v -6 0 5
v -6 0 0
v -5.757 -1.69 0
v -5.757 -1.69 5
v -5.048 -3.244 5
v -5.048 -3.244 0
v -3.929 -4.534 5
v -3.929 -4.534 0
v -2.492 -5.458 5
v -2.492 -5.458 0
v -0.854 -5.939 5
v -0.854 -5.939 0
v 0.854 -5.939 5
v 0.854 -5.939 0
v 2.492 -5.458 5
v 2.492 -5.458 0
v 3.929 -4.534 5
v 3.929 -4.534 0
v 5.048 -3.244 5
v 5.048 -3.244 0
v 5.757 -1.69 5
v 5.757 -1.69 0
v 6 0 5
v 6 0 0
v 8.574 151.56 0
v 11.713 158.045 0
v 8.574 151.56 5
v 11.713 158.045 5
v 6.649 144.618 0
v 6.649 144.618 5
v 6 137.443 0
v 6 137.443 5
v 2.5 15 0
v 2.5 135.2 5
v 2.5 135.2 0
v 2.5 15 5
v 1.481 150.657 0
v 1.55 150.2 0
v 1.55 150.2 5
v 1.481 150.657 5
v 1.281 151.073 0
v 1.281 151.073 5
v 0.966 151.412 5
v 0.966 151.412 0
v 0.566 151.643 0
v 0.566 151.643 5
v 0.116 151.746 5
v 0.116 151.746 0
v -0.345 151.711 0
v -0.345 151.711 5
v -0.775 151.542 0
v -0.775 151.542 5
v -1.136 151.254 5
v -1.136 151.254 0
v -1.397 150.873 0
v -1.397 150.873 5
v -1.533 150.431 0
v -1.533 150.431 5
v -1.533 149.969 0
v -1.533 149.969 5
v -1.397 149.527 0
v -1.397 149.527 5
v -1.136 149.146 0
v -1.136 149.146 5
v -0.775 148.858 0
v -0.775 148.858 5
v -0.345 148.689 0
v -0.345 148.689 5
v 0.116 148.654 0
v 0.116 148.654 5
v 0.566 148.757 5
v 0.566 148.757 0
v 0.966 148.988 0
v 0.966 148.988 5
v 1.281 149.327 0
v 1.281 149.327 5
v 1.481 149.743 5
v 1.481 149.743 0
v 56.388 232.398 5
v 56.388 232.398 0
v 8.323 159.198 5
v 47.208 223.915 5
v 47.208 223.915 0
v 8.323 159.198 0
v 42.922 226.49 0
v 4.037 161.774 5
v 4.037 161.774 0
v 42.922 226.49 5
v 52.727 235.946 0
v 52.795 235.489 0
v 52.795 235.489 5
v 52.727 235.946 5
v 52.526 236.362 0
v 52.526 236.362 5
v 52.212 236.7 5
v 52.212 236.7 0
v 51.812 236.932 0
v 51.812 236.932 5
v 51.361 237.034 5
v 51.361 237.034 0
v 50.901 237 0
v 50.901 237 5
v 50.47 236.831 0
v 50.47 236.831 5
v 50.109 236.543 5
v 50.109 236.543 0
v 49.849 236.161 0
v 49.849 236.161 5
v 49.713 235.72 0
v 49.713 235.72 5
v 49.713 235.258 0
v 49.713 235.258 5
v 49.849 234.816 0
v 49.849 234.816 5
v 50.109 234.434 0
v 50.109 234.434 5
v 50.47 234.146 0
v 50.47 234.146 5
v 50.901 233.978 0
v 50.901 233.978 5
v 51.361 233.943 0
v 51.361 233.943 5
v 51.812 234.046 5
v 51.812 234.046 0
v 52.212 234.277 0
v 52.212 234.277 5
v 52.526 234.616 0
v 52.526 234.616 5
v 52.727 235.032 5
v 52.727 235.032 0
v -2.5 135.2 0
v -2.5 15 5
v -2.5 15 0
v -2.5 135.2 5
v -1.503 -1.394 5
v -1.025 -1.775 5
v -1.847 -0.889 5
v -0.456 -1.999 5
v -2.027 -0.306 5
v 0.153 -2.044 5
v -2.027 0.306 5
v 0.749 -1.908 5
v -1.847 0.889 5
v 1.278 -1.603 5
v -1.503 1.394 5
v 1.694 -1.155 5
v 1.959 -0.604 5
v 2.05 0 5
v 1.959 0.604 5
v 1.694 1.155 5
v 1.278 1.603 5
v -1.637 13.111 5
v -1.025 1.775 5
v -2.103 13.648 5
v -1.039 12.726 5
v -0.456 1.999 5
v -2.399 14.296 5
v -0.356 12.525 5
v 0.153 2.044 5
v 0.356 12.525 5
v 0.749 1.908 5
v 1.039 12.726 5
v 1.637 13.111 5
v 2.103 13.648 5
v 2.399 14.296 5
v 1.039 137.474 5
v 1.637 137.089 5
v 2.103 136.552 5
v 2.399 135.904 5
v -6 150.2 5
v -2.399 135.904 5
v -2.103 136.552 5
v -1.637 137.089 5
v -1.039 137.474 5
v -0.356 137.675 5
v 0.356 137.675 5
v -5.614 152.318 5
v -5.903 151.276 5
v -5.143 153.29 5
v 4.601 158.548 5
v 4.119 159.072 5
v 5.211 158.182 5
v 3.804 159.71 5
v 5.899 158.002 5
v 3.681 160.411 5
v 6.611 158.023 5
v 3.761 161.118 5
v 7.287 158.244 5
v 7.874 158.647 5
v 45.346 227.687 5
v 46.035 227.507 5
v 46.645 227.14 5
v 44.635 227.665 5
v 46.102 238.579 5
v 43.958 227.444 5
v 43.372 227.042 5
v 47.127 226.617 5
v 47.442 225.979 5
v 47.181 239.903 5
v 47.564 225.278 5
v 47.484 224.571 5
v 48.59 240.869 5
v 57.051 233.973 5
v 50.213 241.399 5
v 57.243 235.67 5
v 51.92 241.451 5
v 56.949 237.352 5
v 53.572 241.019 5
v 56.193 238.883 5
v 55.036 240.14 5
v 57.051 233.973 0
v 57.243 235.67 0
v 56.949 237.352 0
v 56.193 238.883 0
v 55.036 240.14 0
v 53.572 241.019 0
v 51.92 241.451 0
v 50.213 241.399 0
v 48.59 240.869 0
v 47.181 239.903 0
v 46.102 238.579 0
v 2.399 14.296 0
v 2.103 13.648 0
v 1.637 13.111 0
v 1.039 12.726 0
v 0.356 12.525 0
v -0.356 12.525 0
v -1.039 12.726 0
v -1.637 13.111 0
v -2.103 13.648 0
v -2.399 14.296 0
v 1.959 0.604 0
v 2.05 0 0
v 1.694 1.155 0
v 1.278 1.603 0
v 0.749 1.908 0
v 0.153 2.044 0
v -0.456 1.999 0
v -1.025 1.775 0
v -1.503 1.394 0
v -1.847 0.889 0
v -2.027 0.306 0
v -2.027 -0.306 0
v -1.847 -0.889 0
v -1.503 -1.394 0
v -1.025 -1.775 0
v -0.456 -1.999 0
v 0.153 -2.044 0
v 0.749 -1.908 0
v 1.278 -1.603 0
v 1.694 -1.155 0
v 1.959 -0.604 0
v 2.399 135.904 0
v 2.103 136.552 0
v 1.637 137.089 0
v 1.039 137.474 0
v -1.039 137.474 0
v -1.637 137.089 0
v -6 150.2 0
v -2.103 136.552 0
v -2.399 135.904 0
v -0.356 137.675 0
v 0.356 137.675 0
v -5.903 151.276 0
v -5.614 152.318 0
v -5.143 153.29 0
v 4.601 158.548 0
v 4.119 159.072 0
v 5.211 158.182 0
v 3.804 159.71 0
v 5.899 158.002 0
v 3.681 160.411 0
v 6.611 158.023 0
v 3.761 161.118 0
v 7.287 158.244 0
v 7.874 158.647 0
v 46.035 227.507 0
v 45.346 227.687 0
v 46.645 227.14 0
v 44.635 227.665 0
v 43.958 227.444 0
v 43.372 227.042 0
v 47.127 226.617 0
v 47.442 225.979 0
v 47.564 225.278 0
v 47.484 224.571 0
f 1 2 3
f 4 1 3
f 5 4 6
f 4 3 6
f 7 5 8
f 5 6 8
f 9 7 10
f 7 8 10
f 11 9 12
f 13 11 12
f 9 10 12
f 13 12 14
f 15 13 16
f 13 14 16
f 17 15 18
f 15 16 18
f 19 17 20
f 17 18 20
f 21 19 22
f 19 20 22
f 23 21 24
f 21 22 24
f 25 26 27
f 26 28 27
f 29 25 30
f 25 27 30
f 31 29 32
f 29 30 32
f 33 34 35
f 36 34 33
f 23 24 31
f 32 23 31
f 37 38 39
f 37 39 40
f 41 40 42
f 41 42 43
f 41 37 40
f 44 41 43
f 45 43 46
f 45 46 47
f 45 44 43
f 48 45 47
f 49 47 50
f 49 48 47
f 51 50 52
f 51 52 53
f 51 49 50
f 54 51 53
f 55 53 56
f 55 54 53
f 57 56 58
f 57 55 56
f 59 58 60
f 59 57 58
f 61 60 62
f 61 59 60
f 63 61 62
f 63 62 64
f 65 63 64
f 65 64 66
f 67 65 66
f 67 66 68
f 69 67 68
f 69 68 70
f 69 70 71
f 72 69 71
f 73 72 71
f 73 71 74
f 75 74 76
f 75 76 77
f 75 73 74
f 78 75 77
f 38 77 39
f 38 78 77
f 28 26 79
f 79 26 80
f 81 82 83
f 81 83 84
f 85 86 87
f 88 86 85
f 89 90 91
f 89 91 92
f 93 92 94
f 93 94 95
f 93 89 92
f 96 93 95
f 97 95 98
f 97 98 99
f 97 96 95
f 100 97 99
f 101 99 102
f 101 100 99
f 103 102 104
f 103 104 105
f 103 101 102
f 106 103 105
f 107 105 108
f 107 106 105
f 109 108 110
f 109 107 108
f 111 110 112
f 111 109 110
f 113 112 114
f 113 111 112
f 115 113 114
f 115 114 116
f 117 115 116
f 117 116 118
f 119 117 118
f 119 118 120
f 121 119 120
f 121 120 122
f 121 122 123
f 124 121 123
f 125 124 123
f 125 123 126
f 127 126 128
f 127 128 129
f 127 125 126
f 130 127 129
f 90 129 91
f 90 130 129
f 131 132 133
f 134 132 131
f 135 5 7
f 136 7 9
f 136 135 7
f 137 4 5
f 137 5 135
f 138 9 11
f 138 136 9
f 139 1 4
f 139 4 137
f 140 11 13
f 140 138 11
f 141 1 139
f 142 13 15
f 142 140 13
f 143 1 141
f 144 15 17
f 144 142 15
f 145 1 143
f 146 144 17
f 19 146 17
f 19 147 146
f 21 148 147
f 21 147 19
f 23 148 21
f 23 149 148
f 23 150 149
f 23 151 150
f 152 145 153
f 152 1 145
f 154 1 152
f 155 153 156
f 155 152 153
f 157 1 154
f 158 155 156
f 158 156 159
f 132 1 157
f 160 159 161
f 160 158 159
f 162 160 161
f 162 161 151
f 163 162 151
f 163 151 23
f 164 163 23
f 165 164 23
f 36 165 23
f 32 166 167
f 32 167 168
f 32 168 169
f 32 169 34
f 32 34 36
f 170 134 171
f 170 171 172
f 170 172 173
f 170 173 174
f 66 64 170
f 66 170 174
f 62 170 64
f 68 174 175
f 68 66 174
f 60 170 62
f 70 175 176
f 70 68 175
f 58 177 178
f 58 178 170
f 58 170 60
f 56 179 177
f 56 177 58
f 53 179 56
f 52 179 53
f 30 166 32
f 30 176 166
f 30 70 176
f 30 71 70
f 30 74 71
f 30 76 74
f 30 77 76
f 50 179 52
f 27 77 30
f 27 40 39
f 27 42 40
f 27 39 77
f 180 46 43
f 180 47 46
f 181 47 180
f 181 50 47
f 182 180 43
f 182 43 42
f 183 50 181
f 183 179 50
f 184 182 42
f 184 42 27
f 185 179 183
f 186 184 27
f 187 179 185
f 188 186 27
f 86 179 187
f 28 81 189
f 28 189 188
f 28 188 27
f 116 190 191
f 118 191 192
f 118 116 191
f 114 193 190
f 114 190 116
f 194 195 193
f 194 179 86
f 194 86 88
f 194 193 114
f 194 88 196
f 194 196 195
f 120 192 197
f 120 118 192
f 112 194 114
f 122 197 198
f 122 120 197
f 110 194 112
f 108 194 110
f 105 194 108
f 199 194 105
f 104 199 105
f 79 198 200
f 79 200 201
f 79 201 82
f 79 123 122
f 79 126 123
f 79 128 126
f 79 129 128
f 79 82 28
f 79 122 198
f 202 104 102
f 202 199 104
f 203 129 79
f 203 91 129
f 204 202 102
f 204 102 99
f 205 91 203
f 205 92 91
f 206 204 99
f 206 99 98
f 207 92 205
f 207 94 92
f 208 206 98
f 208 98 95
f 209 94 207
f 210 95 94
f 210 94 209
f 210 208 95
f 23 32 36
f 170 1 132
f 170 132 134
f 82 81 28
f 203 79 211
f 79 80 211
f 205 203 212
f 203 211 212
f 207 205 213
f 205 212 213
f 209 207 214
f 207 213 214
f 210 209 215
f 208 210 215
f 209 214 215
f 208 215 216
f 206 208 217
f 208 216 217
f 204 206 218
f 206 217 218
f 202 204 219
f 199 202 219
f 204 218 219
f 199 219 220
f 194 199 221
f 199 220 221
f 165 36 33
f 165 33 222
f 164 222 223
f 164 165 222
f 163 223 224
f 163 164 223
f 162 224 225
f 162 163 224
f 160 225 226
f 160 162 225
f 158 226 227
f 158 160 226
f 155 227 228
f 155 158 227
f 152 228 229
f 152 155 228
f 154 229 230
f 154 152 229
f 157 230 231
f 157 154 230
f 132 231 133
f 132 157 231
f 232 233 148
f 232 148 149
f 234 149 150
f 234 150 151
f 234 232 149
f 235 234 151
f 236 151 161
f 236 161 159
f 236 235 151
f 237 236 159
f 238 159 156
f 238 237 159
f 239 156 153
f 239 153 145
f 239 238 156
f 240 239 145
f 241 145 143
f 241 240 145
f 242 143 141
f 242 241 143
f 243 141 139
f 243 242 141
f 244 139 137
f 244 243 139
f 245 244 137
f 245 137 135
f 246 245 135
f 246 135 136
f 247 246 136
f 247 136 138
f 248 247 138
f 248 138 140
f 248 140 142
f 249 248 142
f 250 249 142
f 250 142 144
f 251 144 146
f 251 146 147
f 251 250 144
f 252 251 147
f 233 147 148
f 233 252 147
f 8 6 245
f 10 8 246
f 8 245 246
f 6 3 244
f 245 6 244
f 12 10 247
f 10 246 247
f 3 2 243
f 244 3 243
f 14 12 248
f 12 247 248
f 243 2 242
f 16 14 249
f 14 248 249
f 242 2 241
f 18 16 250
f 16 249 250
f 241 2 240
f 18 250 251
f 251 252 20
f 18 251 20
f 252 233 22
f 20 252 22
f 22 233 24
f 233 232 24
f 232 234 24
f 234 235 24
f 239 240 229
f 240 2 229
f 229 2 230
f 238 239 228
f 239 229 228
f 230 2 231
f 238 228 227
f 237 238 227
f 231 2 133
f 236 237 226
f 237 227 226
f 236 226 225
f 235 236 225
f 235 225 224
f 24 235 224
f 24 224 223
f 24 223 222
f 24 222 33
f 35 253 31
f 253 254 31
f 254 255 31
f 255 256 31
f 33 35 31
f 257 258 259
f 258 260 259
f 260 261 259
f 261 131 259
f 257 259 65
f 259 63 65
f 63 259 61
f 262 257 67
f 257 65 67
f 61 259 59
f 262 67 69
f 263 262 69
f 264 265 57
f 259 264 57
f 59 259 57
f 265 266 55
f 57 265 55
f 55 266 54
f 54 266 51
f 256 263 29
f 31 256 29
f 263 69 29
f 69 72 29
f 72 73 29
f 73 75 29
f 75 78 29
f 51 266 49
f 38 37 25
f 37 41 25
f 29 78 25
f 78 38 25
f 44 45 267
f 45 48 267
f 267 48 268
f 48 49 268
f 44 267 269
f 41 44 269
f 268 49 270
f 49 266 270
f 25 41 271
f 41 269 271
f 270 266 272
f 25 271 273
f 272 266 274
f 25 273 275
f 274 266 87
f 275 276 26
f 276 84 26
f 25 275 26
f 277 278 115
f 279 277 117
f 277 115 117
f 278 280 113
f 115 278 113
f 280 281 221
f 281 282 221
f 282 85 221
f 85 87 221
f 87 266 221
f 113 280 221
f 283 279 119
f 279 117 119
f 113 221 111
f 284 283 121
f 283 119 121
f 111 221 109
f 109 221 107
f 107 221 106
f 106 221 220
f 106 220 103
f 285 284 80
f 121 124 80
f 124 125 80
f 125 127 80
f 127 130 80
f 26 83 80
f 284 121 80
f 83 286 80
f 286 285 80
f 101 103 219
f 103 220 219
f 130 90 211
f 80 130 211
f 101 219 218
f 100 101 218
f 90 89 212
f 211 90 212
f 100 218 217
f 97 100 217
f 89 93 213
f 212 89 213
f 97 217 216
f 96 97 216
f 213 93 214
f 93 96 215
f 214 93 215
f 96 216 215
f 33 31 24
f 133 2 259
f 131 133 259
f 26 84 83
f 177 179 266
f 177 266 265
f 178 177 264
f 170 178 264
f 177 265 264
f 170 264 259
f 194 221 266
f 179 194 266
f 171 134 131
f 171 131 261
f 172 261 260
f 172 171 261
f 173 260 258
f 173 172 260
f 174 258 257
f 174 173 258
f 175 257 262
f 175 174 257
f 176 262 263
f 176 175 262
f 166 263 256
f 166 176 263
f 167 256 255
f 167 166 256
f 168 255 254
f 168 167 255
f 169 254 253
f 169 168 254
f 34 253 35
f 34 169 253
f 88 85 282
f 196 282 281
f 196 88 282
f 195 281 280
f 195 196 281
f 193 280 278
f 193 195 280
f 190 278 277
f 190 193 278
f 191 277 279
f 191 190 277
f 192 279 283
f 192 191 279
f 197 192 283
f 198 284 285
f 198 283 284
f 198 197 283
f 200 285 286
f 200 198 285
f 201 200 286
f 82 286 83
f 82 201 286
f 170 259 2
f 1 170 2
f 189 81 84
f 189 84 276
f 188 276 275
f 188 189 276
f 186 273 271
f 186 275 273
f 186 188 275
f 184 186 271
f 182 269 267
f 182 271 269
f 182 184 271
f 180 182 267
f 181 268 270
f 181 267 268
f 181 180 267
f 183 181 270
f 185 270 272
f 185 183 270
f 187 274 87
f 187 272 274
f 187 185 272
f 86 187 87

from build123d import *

# Parameters (mm, degrees)
SKETCH_1_R          = 6
SKETCH_1_R_2        = 2.05
SKETCH_1_R_3        = 1.55
EXTRUDE_1_DEPTH     = 5
FILLET_1_R          = 40
CUT_EXTRUDE_1_DEPTH = 249.231362274
CUT_EXTRUDE_2_DEPTH = 249.231362274


with BuildPart() as part:
    # 草图1 → 凸台-拉伸1 (new body)
    # profile 1 of 6: a face of its own
    with BuildSketch(Plane.XY):
        with BuildLine():
            Line((6, 0), (6, 148.536084387))
            Line((6, 148.536084387), (5.143034079, 147.109821936))
            ThreePointArc((5.143034079, 147.109821936), (-1.603401935, 144.418209427), (-6, 150.2))
            Line((-6, 150.2), (-6, 0))
            ThreePointArc((-6, 0), (0, 6), (6, 0))
        make_face()
    # profile 2 of 6: a face of its own
    with BuildSketch(Plane.XY):
        Circle(SKETCH_1_R)
        Circle(SKETCH_1_R_2, mode=Mode.SUBTRACT)
    # profile 3 of 6: a face of its own
    with BuildSketch(Plane.XY):
        with BuildLine():
            Line((6, 148.536084387), (56.388486973, 232.398470405))
            ThreePointArc((56.388486973, 232.398470405), (48.155274831, 230.34561439), (46.102418816, 238.578826533))
            Line((46.102418816, 238.578826533), (-5.143034079, 153.290178064))
            ThreePointArc((-5.143034079, 153.290178064), (1.603401935, 155.981790573), (6, 150.2))
            Line((6, 150.2), (6, 148.536084387))
        make_face()
    # profile 4 of 6: a face of its own
    with BuildSketch(Plane.XY):
        with Locations((51.245452895, 235.488648469)):
            Circle(SKETCH_1_R)
        with Locations((51.245452895, 235.488648469)):
            Circle(SKETCH_1_R_3, mode=Mode.SUBTRACT)
    # profile 5 of 6: a face of its own
    with BuildSketch(Plane.XY):
        with Locations((0, 150.2)):
            Circle(SKETCH_1_R)
        with Locations((0, 150.2)):
            Circle(SKETCH_1_R_3, mode=Mode.SUBTRACT)
    # profile 6 of 6: a face of its own
    with BuildSketch(Plane.XY):
        with BuildLine():
            Line((5.143034079, 147.109821936), (6, 148.536084387))
            Line((6, 148.536084387), (6, 150.2))
            ThreePointArc((6, 150.2), (5.781790573, 148.596598065), (5.143034079, 147.109821936))
        make_face()
    extrude(amount=EXTRUDE_1_DEPTH)

    # 圆角1
    fillet_1_edges = [part.edges().sort_by_distance(p)[0] for p in [
        (6, 148.536084387, 2.5),
    ]]
    fillet(fillet_1_edges, radius=FILLET_1_R)

    # 草图3 → 切除-拉伸1 (cut, through all)
    with BuildSketch(Plane.XY.offset(5)):
        with BuildLine():
            Line((2.5, 135.2), (2.5, 15))
            ThreePointArc((2.5, 15), (0, 12.5), (-2.5, 15))
            Line((-2.5, 15), (-2.5, 135.2))
            ThreePointArc((-2.5, 135.2), (0, 137.7), (2.5, 135.2))
        make_face()
    extrude(amount=-CUT_EXTRUDE_1_DEPTH, mode=Mode.SUBTRACT)

    # 草图4 → 切除-拉伸2 (cut, through all)
    with BuildSketch(Plane.XY.offset(5)):
        with BuildLine():
            Line((47.208027633, 223.915006118), (8.323286994, 159.198493964))
            ThreePointArc((8.323286994, 159.198493964), (4.892781935, 158.343137291), (4.037425262, 161.77364235))
            Line((4.037425262, 161.77364235), (42.922165901, 226.490154505))
            ThreePointArc((42.922165901, 226.490154505), (46.35267096, 227.345511178), (47.208027633, 223.915006118))
        make_face()
    extrude(amount=-CUT_EXTRUDE_2_DEPTH, mode=Mode.SUBTRACT)


solid = part.part
